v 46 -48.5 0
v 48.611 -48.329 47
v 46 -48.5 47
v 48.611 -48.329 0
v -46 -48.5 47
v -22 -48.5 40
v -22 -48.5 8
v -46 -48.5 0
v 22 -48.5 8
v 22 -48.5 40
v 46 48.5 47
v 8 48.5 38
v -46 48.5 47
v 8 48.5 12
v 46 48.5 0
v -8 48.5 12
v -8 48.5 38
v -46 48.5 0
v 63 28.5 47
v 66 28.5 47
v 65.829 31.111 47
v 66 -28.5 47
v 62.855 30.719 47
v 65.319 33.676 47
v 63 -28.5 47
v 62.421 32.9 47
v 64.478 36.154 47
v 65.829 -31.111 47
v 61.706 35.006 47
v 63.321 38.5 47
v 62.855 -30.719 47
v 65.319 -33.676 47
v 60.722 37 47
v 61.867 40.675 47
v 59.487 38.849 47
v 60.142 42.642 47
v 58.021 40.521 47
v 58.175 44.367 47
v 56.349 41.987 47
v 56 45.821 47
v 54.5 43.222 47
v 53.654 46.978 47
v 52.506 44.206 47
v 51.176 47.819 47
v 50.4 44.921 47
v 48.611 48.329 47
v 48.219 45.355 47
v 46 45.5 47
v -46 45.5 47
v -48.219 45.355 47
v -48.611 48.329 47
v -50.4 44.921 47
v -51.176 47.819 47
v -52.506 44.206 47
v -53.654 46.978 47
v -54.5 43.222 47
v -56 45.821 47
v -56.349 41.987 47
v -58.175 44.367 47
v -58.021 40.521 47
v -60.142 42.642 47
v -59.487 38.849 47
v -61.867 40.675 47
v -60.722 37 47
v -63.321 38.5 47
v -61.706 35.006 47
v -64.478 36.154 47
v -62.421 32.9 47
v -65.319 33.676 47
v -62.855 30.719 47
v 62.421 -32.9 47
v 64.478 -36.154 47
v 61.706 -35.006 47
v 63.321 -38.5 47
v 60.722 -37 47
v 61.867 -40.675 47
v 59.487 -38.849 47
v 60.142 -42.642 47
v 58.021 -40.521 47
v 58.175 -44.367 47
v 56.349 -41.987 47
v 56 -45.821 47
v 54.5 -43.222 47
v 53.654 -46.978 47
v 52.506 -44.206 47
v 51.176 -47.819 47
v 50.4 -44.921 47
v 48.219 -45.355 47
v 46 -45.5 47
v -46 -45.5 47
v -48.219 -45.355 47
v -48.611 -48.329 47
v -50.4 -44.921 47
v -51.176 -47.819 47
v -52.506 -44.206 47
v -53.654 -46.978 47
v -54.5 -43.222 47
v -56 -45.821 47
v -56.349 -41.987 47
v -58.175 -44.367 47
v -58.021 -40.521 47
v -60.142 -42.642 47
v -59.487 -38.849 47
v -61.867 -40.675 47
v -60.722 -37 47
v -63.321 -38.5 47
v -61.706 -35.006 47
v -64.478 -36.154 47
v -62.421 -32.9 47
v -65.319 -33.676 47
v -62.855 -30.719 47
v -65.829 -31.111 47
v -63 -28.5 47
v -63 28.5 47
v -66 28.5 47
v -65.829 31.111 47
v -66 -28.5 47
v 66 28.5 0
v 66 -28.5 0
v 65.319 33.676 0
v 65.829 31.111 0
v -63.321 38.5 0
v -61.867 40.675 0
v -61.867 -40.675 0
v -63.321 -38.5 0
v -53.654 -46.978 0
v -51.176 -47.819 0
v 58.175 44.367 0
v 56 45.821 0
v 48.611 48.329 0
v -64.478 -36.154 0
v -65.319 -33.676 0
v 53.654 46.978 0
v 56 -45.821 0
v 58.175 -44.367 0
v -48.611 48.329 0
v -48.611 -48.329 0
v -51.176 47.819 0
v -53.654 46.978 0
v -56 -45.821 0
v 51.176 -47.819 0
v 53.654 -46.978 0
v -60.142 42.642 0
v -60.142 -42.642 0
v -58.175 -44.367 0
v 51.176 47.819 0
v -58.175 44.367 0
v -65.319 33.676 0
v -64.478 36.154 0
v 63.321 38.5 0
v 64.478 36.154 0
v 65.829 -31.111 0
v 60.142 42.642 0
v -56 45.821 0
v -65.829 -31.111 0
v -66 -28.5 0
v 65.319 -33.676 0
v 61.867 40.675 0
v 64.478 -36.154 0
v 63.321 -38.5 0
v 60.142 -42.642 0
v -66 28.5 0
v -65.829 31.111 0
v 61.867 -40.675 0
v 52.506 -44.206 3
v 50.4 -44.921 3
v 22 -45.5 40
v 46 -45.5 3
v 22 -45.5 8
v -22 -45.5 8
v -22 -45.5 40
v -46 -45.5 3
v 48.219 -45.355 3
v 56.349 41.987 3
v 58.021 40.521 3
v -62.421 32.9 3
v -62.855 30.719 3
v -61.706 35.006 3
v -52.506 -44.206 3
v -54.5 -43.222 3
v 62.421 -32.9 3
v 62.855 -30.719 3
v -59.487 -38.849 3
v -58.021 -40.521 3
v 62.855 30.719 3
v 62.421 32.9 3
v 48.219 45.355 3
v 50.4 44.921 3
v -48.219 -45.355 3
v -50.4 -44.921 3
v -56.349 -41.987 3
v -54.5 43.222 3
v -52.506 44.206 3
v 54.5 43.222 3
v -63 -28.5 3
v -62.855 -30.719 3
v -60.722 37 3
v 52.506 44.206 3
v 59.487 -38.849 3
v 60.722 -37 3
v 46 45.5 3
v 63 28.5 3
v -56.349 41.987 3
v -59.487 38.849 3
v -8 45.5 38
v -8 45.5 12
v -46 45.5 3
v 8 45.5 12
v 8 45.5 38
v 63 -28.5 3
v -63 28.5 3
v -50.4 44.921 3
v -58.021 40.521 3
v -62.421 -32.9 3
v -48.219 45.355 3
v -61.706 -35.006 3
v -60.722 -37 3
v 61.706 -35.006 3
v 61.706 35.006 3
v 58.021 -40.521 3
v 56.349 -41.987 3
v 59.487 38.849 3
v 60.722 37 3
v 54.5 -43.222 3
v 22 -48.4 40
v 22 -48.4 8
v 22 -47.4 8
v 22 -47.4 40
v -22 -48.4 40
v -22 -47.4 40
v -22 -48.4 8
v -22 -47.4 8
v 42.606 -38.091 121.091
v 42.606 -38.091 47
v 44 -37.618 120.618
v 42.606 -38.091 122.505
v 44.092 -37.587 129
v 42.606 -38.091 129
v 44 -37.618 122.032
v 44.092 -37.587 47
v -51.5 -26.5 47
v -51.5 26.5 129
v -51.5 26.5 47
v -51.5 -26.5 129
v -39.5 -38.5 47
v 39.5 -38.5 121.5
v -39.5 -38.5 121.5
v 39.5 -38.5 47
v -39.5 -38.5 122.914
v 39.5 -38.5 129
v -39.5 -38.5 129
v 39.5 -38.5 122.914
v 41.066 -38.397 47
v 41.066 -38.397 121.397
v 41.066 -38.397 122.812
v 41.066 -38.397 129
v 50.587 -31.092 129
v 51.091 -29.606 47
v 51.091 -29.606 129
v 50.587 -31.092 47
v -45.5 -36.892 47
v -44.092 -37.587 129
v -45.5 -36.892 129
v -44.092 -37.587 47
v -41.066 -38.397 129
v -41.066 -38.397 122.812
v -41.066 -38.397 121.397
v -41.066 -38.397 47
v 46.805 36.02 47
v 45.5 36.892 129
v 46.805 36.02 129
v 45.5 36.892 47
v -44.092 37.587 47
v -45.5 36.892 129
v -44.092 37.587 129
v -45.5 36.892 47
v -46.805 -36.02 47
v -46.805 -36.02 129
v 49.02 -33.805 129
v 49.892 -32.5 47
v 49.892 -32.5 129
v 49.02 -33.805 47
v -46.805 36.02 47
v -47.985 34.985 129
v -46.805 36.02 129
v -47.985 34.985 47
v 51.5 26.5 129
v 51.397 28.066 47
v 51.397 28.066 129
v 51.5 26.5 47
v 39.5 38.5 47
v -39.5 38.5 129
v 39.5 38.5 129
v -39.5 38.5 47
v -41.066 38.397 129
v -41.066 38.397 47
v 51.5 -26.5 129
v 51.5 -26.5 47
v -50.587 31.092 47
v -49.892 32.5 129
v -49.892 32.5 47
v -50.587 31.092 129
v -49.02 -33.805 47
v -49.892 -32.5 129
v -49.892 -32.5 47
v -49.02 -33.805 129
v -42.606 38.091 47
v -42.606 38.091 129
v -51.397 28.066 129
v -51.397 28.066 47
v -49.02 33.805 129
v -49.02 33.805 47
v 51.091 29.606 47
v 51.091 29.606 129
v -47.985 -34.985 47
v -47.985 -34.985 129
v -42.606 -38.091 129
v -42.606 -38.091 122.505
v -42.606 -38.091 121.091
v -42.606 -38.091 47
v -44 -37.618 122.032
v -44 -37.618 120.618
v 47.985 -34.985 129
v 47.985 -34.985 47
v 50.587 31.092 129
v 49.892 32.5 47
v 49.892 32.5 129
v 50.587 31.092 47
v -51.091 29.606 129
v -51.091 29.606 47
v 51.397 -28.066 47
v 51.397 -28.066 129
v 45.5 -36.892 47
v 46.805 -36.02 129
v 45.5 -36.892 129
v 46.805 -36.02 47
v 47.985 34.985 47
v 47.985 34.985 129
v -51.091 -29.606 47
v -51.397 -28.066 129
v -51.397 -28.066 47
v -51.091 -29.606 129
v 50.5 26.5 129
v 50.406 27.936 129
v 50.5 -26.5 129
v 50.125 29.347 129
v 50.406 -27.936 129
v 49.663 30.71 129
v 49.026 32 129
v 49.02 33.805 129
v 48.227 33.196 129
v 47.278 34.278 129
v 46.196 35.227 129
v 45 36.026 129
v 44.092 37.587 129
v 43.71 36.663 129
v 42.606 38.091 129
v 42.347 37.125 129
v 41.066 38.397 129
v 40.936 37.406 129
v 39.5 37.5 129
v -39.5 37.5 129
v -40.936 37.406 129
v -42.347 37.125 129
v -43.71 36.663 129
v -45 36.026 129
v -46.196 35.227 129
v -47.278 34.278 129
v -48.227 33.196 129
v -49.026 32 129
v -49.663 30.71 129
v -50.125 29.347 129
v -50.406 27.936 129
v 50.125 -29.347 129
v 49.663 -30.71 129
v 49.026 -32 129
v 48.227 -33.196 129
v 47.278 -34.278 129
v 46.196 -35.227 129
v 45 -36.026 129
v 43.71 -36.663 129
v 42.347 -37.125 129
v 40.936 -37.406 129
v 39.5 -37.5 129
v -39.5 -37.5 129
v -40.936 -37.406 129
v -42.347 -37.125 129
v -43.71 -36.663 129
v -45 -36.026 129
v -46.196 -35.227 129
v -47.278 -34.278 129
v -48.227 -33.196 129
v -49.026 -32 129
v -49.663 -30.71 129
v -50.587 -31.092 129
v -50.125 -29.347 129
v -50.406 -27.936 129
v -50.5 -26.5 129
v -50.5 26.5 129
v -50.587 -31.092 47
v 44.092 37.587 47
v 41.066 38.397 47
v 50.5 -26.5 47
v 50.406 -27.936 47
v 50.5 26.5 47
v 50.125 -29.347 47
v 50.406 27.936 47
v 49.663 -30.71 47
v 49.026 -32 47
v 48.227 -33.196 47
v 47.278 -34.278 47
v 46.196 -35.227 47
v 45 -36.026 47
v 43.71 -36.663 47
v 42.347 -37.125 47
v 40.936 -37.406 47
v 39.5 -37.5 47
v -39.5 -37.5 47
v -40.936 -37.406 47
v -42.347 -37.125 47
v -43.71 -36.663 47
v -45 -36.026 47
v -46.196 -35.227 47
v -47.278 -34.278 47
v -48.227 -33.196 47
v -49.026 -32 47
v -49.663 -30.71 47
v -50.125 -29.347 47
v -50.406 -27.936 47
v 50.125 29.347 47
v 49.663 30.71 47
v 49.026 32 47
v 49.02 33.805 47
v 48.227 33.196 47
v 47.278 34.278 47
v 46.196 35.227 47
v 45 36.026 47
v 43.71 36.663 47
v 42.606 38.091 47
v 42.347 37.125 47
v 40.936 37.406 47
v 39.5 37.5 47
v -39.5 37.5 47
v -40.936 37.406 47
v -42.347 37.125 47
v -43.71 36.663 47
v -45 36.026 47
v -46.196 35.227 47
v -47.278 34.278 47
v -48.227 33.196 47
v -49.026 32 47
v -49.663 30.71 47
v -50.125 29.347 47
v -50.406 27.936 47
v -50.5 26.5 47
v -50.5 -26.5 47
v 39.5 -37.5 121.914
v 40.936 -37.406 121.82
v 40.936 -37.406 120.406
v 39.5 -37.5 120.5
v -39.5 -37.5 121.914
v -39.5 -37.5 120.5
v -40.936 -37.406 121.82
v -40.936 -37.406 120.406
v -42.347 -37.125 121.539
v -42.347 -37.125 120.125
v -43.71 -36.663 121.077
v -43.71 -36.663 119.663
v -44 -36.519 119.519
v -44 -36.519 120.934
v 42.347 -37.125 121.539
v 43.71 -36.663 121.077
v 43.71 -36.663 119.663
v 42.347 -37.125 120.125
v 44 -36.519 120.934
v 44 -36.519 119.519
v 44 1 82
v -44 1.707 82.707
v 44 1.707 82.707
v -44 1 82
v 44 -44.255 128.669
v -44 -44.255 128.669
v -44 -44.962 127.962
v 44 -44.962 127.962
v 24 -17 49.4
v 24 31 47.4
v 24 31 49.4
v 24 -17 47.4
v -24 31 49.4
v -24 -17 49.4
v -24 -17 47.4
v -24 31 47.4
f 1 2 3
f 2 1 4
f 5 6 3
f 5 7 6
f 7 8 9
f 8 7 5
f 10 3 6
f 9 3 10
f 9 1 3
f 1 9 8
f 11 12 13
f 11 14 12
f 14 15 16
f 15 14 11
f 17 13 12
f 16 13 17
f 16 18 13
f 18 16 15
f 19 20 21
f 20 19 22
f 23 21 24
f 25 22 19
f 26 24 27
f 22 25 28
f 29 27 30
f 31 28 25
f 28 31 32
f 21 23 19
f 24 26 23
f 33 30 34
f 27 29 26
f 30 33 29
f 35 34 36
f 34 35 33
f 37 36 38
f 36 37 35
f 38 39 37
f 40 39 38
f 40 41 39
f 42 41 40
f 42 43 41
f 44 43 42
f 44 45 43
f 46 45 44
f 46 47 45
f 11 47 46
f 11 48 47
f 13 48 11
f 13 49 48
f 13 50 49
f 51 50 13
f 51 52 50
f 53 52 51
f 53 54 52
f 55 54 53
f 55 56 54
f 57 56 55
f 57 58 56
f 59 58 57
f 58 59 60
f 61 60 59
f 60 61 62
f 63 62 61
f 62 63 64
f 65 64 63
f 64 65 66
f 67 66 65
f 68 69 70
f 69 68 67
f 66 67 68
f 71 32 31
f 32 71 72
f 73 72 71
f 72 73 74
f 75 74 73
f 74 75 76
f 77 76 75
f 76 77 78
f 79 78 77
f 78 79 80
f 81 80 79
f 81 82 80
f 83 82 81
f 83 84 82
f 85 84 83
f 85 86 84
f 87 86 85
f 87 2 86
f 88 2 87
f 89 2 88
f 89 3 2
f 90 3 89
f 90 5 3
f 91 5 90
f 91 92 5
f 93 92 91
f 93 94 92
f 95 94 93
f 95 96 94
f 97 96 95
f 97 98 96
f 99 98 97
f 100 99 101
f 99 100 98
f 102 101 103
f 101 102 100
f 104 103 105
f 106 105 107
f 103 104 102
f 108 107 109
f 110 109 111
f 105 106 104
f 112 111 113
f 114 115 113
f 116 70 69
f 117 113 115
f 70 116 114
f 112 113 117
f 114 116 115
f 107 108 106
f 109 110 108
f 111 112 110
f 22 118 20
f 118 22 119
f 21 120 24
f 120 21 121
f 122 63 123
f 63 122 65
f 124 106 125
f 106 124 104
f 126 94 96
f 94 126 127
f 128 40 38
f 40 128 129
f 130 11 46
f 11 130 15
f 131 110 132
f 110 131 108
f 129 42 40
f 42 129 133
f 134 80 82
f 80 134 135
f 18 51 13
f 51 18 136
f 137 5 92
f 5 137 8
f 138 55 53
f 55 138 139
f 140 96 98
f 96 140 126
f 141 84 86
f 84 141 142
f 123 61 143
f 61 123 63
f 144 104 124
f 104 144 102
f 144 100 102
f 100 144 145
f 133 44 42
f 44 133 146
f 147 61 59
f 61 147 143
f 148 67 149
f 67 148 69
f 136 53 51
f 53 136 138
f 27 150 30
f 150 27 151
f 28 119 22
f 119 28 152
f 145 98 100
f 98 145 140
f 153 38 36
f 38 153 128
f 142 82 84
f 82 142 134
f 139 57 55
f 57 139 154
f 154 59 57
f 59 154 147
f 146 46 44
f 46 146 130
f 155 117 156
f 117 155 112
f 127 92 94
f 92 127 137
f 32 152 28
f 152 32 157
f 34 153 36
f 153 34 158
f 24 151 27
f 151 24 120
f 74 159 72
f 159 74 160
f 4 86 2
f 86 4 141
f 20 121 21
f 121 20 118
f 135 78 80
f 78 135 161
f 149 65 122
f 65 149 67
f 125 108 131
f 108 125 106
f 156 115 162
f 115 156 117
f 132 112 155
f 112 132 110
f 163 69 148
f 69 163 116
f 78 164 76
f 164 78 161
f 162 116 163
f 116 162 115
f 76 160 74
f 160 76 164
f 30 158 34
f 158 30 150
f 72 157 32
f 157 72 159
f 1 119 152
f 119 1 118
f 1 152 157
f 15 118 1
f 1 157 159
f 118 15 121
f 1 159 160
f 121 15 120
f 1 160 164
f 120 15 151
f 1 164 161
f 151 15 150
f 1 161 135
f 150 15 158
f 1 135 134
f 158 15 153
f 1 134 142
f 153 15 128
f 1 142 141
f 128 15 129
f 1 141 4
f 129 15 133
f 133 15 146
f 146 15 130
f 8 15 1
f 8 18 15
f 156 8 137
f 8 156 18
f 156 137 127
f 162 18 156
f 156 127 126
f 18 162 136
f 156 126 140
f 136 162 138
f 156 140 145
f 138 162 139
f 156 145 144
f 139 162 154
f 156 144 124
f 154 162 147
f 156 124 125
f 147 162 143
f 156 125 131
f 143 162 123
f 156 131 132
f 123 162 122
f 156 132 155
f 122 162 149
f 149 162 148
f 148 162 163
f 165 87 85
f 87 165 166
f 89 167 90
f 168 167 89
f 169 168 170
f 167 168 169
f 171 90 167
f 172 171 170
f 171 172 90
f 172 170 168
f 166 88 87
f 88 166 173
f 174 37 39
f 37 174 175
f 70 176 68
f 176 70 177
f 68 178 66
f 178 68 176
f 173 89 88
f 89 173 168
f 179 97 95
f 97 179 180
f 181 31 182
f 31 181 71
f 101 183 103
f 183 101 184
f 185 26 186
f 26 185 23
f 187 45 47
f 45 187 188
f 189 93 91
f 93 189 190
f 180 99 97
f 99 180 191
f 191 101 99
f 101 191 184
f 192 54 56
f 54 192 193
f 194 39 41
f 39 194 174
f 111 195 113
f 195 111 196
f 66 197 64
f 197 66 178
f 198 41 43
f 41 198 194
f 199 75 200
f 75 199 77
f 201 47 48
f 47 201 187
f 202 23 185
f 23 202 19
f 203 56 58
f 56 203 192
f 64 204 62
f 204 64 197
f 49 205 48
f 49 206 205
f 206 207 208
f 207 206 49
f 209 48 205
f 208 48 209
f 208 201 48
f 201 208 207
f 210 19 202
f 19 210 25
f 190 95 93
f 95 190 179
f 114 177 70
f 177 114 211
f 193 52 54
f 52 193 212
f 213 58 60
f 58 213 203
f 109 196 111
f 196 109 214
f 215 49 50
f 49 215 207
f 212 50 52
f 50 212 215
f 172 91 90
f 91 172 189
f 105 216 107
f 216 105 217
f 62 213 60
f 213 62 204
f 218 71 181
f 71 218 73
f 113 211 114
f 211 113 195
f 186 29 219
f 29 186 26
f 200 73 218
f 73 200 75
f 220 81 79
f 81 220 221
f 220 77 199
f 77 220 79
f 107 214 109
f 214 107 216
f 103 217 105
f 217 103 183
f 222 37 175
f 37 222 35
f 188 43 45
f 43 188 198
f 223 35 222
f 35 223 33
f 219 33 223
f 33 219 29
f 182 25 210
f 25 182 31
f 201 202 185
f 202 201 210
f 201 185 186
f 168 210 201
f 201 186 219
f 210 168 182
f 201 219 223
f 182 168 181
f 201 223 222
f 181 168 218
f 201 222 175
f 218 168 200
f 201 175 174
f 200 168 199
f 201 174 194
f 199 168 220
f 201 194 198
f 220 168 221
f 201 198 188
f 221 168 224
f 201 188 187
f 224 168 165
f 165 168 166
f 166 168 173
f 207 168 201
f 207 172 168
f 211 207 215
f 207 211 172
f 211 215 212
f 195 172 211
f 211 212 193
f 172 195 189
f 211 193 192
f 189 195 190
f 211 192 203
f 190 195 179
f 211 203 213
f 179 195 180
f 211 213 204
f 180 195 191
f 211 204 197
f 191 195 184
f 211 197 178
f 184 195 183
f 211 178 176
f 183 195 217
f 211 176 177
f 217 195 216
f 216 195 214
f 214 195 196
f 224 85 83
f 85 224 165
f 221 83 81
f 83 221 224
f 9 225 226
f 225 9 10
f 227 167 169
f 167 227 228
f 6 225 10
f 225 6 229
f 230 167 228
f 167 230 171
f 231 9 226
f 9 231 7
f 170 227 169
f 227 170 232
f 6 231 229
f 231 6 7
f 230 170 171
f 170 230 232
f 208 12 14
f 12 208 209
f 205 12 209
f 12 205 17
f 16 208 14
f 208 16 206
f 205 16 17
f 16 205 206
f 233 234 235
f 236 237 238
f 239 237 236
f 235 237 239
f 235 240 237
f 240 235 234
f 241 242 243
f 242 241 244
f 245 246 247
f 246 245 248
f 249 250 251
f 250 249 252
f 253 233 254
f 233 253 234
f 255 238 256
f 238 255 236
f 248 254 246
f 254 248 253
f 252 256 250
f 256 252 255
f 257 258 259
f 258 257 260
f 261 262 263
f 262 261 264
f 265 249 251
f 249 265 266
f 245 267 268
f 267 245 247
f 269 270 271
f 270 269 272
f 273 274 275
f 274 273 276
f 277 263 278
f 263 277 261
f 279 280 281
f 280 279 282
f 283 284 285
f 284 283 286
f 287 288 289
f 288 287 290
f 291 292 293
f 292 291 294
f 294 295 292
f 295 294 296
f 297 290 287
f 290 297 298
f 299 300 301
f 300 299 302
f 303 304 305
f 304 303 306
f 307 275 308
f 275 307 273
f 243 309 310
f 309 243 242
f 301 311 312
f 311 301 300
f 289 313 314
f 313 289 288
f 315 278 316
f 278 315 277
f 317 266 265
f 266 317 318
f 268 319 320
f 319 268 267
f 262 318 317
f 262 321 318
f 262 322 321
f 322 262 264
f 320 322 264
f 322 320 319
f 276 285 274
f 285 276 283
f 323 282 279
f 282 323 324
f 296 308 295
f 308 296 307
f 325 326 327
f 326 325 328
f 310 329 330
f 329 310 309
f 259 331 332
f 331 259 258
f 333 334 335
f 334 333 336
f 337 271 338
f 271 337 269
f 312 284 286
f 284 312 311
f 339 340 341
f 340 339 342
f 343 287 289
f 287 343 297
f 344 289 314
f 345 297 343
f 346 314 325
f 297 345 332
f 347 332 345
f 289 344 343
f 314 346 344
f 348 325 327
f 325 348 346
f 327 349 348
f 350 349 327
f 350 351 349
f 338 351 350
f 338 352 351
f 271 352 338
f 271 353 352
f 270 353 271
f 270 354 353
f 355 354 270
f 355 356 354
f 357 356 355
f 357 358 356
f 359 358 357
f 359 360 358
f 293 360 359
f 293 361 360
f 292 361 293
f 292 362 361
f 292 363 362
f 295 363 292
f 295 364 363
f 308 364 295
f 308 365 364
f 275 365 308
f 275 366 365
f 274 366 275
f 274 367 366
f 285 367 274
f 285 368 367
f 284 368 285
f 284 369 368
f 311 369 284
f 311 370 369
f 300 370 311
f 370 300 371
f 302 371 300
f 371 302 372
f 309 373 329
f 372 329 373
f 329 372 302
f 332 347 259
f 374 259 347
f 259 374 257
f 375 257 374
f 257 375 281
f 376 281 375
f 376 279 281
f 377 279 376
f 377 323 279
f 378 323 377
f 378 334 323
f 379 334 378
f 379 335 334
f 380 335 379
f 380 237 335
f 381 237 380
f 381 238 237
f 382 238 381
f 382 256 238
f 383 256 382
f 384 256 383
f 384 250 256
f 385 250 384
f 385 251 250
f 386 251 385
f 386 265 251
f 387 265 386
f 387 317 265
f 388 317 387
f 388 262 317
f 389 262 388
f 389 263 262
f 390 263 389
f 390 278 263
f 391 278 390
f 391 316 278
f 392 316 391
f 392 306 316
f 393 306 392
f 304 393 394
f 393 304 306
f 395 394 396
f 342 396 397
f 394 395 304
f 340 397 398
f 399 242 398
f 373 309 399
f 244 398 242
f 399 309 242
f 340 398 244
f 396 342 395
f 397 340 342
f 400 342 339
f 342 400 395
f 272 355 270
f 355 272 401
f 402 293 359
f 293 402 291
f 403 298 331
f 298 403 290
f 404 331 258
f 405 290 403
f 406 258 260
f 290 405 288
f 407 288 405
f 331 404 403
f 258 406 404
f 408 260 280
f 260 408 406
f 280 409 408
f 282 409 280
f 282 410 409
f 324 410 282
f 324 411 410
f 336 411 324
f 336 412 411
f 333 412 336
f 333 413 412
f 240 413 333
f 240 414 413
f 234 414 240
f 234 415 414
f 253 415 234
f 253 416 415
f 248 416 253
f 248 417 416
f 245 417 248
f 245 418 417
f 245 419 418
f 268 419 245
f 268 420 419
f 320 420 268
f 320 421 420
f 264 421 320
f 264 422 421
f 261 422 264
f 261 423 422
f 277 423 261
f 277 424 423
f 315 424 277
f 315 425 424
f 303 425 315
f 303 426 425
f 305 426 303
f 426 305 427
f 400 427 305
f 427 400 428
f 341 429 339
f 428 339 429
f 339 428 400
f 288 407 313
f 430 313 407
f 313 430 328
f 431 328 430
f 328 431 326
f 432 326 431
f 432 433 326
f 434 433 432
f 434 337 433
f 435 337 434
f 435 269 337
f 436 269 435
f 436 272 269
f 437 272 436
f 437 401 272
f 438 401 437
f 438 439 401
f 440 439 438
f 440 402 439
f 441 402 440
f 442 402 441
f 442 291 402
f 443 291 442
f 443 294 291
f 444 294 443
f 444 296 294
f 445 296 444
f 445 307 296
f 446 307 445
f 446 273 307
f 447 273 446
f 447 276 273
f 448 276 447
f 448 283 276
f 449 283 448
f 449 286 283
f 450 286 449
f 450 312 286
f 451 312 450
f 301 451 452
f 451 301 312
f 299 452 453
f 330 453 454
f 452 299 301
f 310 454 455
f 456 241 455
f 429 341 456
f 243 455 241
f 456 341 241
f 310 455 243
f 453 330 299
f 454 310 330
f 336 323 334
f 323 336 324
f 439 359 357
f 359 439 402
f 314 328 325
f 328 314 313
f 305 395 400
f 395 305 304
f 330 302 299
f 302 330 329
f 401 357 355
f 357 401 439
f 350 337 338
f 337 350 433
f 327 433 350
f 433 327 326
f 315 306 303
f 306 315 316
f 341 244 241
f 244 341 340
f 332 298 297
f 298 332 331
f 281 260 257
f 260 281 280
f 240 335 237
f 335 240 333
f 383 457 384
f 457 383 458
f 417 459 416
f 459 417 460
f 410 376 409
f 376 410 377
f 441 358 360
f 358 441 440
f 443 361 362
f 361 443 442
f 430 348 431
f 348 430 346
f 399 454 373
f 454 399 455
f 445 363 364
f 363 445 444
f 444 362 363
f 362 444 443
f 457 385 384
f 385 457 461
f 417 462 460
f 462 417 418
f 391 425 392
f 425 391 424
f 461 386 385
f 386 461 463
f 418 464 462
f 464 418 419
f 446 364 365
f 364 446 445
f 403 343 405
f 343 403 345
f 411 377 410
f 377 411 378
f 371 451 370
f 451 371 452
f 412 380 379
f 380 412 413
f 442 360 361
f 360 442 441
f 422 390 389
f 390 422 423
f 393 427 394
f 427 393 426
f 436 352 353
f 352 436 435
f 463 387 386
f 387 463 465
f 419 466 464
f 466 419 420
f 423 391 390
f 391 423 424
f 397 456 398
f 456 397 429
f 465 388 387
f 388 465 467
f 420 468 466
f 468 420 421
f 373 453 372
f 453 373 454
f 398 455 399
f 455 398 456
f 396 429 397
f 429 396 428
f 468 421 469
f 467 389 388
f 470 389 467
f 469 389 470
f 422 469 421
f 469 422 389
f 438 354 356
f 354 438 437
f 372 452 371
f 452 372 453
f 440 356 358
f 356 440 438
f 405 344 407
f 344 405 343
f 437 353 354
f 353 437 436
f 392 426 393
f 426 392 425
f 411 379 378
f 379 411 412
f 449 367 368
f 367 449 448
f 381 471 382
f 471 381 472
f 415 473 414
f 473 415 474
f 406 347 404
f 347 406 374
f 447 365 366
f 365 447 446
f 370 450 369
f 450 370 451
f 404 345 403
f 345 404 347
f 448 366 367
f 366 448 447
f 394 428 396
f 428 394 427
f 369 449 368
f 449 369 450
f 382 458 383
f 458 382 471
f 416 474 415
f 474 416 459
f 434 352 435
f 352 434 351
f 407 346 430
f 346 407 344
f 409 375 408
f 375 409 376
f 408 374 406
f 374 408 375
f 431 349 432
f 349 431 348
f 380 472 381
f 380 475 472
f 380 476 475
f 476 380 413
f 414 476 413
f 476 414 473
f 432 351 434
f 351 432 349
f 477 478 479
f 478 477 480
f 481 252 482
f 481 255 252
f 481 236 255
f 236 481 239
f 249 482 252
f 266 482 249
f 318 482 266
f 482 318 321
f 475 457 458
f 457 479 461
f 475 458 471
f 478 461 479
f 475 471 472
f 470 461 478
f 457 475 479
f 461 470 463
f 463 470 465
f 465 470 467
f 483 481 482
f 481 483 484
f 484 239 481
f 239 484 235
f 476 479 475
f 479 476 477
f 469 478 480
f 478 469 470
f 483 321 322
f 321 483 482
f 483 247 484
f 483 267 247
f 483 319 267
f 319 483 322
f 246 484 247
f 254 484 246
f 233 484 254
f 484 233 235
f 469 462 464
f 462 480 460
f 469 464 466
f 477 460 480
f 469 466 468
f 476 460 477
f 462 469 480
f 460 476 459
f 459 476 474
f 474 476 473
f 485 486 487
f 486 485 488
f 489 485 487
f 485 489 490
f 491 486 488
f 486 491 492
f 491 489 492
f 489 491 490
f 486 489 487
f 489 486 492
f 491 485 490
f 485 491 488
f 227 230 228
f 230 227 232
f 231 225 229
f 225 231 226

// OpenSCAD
// PokéDock V16: dimensional LOOK + printable base mock ONLY.
// NOT an approved fit for any actual AMOLED/OLED, beamsplitter, USB or encoder.
// Units: millimetres. OpenSCAD: -D 'MODE="base"' for ONE solid mock base.
$fn=48;
MODE="assembly"; // "base" (printable mock only), "assembly" (concept visualization)
W=132; D=97; H=47; R=20; WALL=3.0;
CHAMBER_W=103;CHAMBER_D=77;CHAMBER_H=82;CHAMBER_R=12;
module rr(w,d,r){offset(r=r) square([w-2*r,d-2*r],center=true);}
module blank_base(){linear_extrude(height=H) rr(W,D,R);}
module base() {
 difference(){
   blank_base();
   // Open top: avoids trapping prototype board; not a PCB mount.
   translate([0,0,WALL]) linear_extrude(height=H+2) rr(W-2*WALL,D-2*WALL,R-WALL);
   // Front CLOCK aperture ONLY; do not infer actual SSD1327 mounting method.
   translate([-22,-D/2-1,8]) cube([44,WALL+3,32]);
   // Rear cable notch; location provisional.
   translate([-8,D/2-WALL-1,12]) cube([16,WALL+3,26]);
 }
}
module chamber_mock(){
 // A rounded, clear outer visual shell -- this is NOT an optical reflector.
 color([0.77,0.67,0.95,0.18])
 translate([0,0,H+CHAMBER_H/2])
 difference(){
   linear_extrude(height=CHAMBER_H,center=true) rr(CHAMBER_W,CHAMBER_D,CHAMBER_R);
   linear_extrude(height=CHAMBER_H+2,center=true) rr(CHAMBER_W-2,CHAMBER_D-2,CHAMBER_R-1);
 }
 // One FLAT 45-degree internal reflector in conceptual position.
 color([0.73,0.89,1,0.22])
 translate([-44,1,H+35]) rotate([45,0,0]) cube([88,1.0,65],center=false);
 // optical source placeholder below chamber
 color([0.1,0.08,0.15]) translate([-24,-17,H+0.4]) cube([48,48,2]);
 // Clock image plane placeholder visible through aperture
 color([0.08,0.07,0.1]) translate([-22,-D/2+0.1,8]) cube([44,1,32]);
}
if (MODE=="base") base();
else if (MODE=="assembly") {color([0.92,0.87,0.84]) base();chamber_mock();}
else assert(false,str("Unknown MODE=",MODE));
